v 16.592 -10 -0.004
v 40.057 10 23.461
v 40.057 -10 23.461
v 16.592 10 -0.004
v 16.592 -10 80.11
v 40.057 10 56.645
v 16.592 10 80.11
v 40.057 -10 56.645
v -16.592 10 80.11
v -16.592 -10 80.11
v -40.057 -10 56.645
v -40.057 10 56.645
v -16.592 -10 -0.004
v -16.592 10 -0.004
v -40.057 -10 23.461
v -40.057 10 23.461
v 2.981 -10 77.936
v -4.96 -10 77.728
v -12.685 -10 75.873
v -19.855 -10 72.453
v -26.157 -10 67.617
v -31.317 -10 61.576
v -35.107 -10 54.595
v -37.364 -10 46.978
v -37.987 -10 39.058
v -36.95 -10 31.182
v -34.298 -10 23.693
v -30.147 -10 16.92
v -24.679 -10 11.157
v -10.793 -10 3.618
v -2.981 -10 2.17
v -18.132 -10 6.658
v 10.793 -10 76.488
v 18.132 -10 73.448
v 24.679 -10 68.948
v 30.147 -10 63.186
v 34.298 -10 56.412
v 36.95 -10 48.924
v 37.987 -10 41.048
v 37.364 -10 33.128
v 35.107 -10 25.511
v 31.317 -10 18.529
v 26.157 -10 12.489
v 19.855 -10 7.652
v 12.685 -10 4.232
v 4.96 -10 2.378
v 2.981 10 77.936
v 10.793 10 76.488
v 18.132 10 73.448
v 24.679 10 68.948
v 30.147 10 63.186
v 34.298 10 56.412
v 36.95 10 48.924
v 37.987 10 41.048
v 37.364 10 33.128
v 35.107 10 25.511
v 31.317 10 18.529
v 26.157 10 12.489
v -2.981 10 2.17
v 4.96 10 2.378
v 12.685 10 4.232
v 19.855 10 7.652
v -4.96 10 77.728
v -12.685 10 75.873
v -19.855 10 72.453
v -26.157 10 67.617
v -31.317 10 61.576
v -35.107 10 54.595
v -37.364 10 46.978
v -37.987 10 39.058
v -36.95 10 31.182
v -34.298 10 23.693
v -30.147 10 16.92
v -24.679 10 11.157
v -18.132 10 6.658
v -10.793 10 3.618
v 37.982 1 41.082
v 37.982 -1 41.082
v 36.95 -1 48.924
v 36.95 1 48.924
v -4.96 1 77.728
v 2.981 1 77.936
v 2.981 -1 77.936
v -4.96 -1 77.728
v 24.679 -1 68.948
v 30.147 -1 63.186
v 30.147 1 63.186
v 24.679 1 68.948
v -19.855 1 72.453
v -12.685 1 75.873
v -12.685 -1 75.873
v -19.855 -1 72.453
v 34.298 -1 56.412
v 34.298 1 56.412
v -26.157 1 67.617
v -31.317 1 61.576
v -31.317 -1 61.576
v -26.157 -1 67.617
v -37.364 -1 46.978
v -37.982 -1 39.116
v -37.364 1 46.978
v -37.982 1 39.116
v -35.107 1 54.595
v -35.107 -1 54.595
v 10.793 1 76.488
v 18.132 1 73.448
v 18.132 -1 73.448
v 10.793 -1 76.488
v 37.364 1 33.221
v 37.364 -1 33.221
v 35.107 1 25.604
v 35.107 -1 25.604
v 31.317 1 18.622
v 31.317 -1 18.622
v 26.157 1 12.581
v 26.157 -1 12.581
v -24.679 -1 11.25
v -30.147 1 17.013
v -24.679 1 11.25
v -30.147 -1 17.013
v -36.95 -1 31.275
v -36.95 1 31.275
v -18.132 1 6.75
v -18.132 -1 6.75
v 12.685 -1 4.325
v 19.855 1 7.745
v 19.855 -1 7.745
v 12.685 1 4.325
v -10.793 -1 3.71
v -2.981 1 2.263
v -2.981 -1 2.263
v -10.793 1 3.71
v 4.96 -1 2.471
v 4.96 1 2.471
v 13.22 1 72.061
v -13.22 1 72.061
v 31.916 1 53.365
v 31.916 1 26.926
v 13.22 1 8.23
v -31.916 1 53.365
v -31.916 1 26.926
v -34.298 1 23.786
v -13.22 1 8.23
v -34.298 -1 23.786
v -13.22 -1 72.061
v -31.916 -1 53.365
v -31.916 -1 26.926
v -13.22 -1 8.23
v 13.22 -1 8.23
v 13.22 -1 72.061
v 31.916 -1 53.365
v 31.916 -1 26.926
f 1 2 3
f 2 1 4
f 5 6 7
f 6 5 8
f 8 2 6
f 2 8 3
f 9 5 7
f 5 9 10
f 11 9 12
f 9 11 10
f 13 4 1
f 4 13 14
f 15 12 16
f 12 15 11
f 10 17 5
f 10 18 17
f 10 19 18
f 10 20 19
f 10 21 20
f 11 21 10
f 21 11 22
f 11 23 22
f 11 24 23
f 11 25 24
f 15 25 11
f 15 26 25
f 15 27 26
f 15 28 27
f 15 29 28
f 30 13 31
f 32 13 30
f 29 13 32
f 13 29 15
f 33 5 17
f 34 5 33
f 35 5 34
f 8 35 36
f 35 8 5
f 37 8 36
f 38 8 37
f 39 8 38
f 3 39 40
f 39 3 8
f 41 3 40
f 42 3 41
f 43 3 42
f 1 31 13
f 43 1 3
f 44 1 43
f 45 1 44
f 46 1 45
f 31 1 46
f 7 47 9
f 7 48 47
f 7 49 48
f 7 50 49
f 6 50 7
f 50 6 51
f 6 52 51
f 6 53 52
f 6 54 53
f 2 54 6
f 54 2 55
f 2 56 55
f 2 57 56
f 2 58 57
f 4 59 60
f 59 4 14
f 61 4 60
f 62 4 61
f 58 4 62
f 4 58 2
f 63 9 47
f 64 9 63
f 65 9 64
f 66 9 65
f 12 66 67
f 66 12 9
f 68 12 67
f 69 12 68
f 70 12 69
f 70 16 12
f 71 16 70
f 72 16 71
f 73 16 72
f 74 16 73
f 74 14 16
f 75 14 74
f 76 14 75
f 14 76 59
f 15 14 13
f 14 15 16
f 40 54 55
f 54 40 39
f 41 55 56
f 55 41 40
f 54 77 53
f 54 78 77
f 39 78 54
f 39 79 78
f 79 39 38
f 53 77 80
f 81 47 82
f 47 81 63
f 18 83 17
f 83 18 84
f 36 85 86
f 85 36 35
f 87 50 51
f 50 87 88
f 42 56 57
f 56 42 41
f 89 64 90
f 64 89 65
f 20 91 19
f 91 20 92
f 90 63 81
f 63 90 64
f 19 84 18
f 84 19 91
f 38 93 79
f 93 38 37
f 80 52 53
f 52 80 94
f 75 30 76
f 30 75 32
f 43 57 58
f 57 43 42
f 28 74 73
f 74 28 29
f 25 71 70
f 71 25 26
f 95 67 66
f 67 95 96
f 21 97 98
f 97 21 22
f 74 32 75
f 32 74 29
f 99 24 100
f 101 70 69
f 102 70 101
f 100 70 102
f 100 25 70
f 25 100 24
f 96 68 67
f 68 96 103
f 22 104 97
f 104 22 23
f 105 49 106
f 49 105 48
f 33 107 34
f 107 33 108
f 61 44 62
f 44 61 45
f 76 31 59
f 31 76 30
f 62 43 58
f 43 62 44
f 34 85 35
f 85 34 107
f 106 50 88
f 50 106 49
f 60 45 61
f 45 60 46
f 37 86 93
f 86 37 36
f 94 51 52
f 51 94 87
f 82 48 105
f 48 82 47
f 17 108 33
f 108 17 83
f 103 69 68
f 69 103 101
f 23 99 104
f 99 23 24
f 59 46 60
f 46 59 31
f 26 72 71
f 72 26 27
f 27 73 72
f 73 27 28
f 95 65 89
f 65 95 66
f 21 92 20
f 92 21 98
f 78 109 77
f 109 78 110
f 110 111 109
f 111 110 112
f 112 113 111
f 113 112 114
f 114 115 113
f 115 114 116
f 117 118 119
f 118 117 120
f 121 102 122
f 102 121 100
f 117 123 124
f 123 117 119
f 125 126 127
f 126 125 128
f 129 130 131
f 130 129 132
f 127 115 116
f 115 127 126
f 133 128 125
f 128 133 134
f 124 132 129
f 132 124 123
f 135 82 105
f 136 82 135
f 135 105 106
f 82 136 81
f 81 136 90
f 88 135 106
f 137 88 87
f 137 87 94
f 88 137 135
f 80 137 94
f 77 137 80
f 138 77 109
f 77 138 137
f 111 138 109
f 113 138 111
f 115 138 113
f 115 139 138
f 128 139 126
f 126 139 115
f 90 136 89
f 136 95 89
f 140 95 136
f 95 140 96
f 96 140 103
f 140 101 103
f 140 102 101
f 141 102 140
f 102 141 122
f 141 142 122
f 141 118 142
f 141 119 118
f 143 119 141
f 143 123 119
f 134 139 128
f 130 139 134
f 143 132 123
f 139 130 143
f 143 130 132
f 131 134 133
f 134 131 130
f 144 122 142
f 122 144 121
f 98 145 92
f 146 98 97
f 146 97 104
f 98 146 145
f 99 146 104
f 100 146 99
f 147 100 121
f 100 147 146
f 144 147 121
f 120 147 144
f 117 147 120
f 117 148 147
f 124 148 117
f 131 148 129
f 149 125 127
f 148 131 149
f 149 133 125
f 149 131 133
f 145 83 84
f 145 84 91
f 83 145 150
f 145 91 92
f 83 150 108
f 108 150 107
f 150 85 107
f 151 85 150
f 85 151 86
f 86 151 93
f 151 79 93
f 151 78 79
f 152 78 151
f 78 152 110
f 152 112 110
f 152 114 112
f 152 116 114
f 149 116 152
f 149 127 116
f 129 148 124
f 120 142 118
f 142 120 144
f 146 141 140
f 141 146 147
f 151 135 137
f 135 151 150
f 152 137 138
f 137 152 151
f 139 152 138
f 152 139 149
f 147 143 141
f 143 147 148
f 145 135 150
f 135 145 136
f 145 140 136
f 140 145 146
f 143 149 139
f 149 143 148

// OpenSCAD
// Can Stacking Plate:
//
//	Simple Cylinder with plate to help stacking cans in the pantry.
//   We use 45 degree settings to allow overhang printing if required.
//

// In mm.
	DiameterOfCan = 75; 

// In mm.
	HeightOfStacker = 20;

	InnerSpacing = 1 * 1;
	ThicknessOfCylinder = DiameterOfCan/7; 
	ThicknessOfPlate = 2 * 1;
	HeightOfPlate = ( HeightOfStacker - ThicknessOfPlate)/2 ;

// Offset and rotate for build platform.

	translate([0,HeightOfStacker/2,(DiameterOfCan + InnerSpacing+ThicknessOfCylinder)/2.165 ]) 
	rotate([90,45/2,0]) 

// Generate outer cylinder

	difference() {

		cylinder( h=HeightOfStacker, r=(DiameterOfCan + InnerSpacing + ThicknessOfCylinder)/2, $fa = 45);
 		cylinder( h=HeightOfStacker, r=(DiameterOfCan + InnerSpacing)/2, $fs = 1 );
	}

// Offset and rotate for build platform.

	translate([0,HeightOfStacker/2,(DiameterOfCan + InnerSpacing+ ThicknessOfCylinder)/2.16 ]) 
	rotate([90,45/2,0])	
	translate([0,0,HeightOfPlate ])

// Generate inner support.
	
	difference() {
		cylinder( h=ThicknessOfPlate, r=(DiameterOfCan + InnerSpacing)/2, $fs = 1);
		cylinder( h=ThicknessOfPlate, r=(DiameterOfCan + InnerSpacing)/2.2, $fs = 30);
	}
